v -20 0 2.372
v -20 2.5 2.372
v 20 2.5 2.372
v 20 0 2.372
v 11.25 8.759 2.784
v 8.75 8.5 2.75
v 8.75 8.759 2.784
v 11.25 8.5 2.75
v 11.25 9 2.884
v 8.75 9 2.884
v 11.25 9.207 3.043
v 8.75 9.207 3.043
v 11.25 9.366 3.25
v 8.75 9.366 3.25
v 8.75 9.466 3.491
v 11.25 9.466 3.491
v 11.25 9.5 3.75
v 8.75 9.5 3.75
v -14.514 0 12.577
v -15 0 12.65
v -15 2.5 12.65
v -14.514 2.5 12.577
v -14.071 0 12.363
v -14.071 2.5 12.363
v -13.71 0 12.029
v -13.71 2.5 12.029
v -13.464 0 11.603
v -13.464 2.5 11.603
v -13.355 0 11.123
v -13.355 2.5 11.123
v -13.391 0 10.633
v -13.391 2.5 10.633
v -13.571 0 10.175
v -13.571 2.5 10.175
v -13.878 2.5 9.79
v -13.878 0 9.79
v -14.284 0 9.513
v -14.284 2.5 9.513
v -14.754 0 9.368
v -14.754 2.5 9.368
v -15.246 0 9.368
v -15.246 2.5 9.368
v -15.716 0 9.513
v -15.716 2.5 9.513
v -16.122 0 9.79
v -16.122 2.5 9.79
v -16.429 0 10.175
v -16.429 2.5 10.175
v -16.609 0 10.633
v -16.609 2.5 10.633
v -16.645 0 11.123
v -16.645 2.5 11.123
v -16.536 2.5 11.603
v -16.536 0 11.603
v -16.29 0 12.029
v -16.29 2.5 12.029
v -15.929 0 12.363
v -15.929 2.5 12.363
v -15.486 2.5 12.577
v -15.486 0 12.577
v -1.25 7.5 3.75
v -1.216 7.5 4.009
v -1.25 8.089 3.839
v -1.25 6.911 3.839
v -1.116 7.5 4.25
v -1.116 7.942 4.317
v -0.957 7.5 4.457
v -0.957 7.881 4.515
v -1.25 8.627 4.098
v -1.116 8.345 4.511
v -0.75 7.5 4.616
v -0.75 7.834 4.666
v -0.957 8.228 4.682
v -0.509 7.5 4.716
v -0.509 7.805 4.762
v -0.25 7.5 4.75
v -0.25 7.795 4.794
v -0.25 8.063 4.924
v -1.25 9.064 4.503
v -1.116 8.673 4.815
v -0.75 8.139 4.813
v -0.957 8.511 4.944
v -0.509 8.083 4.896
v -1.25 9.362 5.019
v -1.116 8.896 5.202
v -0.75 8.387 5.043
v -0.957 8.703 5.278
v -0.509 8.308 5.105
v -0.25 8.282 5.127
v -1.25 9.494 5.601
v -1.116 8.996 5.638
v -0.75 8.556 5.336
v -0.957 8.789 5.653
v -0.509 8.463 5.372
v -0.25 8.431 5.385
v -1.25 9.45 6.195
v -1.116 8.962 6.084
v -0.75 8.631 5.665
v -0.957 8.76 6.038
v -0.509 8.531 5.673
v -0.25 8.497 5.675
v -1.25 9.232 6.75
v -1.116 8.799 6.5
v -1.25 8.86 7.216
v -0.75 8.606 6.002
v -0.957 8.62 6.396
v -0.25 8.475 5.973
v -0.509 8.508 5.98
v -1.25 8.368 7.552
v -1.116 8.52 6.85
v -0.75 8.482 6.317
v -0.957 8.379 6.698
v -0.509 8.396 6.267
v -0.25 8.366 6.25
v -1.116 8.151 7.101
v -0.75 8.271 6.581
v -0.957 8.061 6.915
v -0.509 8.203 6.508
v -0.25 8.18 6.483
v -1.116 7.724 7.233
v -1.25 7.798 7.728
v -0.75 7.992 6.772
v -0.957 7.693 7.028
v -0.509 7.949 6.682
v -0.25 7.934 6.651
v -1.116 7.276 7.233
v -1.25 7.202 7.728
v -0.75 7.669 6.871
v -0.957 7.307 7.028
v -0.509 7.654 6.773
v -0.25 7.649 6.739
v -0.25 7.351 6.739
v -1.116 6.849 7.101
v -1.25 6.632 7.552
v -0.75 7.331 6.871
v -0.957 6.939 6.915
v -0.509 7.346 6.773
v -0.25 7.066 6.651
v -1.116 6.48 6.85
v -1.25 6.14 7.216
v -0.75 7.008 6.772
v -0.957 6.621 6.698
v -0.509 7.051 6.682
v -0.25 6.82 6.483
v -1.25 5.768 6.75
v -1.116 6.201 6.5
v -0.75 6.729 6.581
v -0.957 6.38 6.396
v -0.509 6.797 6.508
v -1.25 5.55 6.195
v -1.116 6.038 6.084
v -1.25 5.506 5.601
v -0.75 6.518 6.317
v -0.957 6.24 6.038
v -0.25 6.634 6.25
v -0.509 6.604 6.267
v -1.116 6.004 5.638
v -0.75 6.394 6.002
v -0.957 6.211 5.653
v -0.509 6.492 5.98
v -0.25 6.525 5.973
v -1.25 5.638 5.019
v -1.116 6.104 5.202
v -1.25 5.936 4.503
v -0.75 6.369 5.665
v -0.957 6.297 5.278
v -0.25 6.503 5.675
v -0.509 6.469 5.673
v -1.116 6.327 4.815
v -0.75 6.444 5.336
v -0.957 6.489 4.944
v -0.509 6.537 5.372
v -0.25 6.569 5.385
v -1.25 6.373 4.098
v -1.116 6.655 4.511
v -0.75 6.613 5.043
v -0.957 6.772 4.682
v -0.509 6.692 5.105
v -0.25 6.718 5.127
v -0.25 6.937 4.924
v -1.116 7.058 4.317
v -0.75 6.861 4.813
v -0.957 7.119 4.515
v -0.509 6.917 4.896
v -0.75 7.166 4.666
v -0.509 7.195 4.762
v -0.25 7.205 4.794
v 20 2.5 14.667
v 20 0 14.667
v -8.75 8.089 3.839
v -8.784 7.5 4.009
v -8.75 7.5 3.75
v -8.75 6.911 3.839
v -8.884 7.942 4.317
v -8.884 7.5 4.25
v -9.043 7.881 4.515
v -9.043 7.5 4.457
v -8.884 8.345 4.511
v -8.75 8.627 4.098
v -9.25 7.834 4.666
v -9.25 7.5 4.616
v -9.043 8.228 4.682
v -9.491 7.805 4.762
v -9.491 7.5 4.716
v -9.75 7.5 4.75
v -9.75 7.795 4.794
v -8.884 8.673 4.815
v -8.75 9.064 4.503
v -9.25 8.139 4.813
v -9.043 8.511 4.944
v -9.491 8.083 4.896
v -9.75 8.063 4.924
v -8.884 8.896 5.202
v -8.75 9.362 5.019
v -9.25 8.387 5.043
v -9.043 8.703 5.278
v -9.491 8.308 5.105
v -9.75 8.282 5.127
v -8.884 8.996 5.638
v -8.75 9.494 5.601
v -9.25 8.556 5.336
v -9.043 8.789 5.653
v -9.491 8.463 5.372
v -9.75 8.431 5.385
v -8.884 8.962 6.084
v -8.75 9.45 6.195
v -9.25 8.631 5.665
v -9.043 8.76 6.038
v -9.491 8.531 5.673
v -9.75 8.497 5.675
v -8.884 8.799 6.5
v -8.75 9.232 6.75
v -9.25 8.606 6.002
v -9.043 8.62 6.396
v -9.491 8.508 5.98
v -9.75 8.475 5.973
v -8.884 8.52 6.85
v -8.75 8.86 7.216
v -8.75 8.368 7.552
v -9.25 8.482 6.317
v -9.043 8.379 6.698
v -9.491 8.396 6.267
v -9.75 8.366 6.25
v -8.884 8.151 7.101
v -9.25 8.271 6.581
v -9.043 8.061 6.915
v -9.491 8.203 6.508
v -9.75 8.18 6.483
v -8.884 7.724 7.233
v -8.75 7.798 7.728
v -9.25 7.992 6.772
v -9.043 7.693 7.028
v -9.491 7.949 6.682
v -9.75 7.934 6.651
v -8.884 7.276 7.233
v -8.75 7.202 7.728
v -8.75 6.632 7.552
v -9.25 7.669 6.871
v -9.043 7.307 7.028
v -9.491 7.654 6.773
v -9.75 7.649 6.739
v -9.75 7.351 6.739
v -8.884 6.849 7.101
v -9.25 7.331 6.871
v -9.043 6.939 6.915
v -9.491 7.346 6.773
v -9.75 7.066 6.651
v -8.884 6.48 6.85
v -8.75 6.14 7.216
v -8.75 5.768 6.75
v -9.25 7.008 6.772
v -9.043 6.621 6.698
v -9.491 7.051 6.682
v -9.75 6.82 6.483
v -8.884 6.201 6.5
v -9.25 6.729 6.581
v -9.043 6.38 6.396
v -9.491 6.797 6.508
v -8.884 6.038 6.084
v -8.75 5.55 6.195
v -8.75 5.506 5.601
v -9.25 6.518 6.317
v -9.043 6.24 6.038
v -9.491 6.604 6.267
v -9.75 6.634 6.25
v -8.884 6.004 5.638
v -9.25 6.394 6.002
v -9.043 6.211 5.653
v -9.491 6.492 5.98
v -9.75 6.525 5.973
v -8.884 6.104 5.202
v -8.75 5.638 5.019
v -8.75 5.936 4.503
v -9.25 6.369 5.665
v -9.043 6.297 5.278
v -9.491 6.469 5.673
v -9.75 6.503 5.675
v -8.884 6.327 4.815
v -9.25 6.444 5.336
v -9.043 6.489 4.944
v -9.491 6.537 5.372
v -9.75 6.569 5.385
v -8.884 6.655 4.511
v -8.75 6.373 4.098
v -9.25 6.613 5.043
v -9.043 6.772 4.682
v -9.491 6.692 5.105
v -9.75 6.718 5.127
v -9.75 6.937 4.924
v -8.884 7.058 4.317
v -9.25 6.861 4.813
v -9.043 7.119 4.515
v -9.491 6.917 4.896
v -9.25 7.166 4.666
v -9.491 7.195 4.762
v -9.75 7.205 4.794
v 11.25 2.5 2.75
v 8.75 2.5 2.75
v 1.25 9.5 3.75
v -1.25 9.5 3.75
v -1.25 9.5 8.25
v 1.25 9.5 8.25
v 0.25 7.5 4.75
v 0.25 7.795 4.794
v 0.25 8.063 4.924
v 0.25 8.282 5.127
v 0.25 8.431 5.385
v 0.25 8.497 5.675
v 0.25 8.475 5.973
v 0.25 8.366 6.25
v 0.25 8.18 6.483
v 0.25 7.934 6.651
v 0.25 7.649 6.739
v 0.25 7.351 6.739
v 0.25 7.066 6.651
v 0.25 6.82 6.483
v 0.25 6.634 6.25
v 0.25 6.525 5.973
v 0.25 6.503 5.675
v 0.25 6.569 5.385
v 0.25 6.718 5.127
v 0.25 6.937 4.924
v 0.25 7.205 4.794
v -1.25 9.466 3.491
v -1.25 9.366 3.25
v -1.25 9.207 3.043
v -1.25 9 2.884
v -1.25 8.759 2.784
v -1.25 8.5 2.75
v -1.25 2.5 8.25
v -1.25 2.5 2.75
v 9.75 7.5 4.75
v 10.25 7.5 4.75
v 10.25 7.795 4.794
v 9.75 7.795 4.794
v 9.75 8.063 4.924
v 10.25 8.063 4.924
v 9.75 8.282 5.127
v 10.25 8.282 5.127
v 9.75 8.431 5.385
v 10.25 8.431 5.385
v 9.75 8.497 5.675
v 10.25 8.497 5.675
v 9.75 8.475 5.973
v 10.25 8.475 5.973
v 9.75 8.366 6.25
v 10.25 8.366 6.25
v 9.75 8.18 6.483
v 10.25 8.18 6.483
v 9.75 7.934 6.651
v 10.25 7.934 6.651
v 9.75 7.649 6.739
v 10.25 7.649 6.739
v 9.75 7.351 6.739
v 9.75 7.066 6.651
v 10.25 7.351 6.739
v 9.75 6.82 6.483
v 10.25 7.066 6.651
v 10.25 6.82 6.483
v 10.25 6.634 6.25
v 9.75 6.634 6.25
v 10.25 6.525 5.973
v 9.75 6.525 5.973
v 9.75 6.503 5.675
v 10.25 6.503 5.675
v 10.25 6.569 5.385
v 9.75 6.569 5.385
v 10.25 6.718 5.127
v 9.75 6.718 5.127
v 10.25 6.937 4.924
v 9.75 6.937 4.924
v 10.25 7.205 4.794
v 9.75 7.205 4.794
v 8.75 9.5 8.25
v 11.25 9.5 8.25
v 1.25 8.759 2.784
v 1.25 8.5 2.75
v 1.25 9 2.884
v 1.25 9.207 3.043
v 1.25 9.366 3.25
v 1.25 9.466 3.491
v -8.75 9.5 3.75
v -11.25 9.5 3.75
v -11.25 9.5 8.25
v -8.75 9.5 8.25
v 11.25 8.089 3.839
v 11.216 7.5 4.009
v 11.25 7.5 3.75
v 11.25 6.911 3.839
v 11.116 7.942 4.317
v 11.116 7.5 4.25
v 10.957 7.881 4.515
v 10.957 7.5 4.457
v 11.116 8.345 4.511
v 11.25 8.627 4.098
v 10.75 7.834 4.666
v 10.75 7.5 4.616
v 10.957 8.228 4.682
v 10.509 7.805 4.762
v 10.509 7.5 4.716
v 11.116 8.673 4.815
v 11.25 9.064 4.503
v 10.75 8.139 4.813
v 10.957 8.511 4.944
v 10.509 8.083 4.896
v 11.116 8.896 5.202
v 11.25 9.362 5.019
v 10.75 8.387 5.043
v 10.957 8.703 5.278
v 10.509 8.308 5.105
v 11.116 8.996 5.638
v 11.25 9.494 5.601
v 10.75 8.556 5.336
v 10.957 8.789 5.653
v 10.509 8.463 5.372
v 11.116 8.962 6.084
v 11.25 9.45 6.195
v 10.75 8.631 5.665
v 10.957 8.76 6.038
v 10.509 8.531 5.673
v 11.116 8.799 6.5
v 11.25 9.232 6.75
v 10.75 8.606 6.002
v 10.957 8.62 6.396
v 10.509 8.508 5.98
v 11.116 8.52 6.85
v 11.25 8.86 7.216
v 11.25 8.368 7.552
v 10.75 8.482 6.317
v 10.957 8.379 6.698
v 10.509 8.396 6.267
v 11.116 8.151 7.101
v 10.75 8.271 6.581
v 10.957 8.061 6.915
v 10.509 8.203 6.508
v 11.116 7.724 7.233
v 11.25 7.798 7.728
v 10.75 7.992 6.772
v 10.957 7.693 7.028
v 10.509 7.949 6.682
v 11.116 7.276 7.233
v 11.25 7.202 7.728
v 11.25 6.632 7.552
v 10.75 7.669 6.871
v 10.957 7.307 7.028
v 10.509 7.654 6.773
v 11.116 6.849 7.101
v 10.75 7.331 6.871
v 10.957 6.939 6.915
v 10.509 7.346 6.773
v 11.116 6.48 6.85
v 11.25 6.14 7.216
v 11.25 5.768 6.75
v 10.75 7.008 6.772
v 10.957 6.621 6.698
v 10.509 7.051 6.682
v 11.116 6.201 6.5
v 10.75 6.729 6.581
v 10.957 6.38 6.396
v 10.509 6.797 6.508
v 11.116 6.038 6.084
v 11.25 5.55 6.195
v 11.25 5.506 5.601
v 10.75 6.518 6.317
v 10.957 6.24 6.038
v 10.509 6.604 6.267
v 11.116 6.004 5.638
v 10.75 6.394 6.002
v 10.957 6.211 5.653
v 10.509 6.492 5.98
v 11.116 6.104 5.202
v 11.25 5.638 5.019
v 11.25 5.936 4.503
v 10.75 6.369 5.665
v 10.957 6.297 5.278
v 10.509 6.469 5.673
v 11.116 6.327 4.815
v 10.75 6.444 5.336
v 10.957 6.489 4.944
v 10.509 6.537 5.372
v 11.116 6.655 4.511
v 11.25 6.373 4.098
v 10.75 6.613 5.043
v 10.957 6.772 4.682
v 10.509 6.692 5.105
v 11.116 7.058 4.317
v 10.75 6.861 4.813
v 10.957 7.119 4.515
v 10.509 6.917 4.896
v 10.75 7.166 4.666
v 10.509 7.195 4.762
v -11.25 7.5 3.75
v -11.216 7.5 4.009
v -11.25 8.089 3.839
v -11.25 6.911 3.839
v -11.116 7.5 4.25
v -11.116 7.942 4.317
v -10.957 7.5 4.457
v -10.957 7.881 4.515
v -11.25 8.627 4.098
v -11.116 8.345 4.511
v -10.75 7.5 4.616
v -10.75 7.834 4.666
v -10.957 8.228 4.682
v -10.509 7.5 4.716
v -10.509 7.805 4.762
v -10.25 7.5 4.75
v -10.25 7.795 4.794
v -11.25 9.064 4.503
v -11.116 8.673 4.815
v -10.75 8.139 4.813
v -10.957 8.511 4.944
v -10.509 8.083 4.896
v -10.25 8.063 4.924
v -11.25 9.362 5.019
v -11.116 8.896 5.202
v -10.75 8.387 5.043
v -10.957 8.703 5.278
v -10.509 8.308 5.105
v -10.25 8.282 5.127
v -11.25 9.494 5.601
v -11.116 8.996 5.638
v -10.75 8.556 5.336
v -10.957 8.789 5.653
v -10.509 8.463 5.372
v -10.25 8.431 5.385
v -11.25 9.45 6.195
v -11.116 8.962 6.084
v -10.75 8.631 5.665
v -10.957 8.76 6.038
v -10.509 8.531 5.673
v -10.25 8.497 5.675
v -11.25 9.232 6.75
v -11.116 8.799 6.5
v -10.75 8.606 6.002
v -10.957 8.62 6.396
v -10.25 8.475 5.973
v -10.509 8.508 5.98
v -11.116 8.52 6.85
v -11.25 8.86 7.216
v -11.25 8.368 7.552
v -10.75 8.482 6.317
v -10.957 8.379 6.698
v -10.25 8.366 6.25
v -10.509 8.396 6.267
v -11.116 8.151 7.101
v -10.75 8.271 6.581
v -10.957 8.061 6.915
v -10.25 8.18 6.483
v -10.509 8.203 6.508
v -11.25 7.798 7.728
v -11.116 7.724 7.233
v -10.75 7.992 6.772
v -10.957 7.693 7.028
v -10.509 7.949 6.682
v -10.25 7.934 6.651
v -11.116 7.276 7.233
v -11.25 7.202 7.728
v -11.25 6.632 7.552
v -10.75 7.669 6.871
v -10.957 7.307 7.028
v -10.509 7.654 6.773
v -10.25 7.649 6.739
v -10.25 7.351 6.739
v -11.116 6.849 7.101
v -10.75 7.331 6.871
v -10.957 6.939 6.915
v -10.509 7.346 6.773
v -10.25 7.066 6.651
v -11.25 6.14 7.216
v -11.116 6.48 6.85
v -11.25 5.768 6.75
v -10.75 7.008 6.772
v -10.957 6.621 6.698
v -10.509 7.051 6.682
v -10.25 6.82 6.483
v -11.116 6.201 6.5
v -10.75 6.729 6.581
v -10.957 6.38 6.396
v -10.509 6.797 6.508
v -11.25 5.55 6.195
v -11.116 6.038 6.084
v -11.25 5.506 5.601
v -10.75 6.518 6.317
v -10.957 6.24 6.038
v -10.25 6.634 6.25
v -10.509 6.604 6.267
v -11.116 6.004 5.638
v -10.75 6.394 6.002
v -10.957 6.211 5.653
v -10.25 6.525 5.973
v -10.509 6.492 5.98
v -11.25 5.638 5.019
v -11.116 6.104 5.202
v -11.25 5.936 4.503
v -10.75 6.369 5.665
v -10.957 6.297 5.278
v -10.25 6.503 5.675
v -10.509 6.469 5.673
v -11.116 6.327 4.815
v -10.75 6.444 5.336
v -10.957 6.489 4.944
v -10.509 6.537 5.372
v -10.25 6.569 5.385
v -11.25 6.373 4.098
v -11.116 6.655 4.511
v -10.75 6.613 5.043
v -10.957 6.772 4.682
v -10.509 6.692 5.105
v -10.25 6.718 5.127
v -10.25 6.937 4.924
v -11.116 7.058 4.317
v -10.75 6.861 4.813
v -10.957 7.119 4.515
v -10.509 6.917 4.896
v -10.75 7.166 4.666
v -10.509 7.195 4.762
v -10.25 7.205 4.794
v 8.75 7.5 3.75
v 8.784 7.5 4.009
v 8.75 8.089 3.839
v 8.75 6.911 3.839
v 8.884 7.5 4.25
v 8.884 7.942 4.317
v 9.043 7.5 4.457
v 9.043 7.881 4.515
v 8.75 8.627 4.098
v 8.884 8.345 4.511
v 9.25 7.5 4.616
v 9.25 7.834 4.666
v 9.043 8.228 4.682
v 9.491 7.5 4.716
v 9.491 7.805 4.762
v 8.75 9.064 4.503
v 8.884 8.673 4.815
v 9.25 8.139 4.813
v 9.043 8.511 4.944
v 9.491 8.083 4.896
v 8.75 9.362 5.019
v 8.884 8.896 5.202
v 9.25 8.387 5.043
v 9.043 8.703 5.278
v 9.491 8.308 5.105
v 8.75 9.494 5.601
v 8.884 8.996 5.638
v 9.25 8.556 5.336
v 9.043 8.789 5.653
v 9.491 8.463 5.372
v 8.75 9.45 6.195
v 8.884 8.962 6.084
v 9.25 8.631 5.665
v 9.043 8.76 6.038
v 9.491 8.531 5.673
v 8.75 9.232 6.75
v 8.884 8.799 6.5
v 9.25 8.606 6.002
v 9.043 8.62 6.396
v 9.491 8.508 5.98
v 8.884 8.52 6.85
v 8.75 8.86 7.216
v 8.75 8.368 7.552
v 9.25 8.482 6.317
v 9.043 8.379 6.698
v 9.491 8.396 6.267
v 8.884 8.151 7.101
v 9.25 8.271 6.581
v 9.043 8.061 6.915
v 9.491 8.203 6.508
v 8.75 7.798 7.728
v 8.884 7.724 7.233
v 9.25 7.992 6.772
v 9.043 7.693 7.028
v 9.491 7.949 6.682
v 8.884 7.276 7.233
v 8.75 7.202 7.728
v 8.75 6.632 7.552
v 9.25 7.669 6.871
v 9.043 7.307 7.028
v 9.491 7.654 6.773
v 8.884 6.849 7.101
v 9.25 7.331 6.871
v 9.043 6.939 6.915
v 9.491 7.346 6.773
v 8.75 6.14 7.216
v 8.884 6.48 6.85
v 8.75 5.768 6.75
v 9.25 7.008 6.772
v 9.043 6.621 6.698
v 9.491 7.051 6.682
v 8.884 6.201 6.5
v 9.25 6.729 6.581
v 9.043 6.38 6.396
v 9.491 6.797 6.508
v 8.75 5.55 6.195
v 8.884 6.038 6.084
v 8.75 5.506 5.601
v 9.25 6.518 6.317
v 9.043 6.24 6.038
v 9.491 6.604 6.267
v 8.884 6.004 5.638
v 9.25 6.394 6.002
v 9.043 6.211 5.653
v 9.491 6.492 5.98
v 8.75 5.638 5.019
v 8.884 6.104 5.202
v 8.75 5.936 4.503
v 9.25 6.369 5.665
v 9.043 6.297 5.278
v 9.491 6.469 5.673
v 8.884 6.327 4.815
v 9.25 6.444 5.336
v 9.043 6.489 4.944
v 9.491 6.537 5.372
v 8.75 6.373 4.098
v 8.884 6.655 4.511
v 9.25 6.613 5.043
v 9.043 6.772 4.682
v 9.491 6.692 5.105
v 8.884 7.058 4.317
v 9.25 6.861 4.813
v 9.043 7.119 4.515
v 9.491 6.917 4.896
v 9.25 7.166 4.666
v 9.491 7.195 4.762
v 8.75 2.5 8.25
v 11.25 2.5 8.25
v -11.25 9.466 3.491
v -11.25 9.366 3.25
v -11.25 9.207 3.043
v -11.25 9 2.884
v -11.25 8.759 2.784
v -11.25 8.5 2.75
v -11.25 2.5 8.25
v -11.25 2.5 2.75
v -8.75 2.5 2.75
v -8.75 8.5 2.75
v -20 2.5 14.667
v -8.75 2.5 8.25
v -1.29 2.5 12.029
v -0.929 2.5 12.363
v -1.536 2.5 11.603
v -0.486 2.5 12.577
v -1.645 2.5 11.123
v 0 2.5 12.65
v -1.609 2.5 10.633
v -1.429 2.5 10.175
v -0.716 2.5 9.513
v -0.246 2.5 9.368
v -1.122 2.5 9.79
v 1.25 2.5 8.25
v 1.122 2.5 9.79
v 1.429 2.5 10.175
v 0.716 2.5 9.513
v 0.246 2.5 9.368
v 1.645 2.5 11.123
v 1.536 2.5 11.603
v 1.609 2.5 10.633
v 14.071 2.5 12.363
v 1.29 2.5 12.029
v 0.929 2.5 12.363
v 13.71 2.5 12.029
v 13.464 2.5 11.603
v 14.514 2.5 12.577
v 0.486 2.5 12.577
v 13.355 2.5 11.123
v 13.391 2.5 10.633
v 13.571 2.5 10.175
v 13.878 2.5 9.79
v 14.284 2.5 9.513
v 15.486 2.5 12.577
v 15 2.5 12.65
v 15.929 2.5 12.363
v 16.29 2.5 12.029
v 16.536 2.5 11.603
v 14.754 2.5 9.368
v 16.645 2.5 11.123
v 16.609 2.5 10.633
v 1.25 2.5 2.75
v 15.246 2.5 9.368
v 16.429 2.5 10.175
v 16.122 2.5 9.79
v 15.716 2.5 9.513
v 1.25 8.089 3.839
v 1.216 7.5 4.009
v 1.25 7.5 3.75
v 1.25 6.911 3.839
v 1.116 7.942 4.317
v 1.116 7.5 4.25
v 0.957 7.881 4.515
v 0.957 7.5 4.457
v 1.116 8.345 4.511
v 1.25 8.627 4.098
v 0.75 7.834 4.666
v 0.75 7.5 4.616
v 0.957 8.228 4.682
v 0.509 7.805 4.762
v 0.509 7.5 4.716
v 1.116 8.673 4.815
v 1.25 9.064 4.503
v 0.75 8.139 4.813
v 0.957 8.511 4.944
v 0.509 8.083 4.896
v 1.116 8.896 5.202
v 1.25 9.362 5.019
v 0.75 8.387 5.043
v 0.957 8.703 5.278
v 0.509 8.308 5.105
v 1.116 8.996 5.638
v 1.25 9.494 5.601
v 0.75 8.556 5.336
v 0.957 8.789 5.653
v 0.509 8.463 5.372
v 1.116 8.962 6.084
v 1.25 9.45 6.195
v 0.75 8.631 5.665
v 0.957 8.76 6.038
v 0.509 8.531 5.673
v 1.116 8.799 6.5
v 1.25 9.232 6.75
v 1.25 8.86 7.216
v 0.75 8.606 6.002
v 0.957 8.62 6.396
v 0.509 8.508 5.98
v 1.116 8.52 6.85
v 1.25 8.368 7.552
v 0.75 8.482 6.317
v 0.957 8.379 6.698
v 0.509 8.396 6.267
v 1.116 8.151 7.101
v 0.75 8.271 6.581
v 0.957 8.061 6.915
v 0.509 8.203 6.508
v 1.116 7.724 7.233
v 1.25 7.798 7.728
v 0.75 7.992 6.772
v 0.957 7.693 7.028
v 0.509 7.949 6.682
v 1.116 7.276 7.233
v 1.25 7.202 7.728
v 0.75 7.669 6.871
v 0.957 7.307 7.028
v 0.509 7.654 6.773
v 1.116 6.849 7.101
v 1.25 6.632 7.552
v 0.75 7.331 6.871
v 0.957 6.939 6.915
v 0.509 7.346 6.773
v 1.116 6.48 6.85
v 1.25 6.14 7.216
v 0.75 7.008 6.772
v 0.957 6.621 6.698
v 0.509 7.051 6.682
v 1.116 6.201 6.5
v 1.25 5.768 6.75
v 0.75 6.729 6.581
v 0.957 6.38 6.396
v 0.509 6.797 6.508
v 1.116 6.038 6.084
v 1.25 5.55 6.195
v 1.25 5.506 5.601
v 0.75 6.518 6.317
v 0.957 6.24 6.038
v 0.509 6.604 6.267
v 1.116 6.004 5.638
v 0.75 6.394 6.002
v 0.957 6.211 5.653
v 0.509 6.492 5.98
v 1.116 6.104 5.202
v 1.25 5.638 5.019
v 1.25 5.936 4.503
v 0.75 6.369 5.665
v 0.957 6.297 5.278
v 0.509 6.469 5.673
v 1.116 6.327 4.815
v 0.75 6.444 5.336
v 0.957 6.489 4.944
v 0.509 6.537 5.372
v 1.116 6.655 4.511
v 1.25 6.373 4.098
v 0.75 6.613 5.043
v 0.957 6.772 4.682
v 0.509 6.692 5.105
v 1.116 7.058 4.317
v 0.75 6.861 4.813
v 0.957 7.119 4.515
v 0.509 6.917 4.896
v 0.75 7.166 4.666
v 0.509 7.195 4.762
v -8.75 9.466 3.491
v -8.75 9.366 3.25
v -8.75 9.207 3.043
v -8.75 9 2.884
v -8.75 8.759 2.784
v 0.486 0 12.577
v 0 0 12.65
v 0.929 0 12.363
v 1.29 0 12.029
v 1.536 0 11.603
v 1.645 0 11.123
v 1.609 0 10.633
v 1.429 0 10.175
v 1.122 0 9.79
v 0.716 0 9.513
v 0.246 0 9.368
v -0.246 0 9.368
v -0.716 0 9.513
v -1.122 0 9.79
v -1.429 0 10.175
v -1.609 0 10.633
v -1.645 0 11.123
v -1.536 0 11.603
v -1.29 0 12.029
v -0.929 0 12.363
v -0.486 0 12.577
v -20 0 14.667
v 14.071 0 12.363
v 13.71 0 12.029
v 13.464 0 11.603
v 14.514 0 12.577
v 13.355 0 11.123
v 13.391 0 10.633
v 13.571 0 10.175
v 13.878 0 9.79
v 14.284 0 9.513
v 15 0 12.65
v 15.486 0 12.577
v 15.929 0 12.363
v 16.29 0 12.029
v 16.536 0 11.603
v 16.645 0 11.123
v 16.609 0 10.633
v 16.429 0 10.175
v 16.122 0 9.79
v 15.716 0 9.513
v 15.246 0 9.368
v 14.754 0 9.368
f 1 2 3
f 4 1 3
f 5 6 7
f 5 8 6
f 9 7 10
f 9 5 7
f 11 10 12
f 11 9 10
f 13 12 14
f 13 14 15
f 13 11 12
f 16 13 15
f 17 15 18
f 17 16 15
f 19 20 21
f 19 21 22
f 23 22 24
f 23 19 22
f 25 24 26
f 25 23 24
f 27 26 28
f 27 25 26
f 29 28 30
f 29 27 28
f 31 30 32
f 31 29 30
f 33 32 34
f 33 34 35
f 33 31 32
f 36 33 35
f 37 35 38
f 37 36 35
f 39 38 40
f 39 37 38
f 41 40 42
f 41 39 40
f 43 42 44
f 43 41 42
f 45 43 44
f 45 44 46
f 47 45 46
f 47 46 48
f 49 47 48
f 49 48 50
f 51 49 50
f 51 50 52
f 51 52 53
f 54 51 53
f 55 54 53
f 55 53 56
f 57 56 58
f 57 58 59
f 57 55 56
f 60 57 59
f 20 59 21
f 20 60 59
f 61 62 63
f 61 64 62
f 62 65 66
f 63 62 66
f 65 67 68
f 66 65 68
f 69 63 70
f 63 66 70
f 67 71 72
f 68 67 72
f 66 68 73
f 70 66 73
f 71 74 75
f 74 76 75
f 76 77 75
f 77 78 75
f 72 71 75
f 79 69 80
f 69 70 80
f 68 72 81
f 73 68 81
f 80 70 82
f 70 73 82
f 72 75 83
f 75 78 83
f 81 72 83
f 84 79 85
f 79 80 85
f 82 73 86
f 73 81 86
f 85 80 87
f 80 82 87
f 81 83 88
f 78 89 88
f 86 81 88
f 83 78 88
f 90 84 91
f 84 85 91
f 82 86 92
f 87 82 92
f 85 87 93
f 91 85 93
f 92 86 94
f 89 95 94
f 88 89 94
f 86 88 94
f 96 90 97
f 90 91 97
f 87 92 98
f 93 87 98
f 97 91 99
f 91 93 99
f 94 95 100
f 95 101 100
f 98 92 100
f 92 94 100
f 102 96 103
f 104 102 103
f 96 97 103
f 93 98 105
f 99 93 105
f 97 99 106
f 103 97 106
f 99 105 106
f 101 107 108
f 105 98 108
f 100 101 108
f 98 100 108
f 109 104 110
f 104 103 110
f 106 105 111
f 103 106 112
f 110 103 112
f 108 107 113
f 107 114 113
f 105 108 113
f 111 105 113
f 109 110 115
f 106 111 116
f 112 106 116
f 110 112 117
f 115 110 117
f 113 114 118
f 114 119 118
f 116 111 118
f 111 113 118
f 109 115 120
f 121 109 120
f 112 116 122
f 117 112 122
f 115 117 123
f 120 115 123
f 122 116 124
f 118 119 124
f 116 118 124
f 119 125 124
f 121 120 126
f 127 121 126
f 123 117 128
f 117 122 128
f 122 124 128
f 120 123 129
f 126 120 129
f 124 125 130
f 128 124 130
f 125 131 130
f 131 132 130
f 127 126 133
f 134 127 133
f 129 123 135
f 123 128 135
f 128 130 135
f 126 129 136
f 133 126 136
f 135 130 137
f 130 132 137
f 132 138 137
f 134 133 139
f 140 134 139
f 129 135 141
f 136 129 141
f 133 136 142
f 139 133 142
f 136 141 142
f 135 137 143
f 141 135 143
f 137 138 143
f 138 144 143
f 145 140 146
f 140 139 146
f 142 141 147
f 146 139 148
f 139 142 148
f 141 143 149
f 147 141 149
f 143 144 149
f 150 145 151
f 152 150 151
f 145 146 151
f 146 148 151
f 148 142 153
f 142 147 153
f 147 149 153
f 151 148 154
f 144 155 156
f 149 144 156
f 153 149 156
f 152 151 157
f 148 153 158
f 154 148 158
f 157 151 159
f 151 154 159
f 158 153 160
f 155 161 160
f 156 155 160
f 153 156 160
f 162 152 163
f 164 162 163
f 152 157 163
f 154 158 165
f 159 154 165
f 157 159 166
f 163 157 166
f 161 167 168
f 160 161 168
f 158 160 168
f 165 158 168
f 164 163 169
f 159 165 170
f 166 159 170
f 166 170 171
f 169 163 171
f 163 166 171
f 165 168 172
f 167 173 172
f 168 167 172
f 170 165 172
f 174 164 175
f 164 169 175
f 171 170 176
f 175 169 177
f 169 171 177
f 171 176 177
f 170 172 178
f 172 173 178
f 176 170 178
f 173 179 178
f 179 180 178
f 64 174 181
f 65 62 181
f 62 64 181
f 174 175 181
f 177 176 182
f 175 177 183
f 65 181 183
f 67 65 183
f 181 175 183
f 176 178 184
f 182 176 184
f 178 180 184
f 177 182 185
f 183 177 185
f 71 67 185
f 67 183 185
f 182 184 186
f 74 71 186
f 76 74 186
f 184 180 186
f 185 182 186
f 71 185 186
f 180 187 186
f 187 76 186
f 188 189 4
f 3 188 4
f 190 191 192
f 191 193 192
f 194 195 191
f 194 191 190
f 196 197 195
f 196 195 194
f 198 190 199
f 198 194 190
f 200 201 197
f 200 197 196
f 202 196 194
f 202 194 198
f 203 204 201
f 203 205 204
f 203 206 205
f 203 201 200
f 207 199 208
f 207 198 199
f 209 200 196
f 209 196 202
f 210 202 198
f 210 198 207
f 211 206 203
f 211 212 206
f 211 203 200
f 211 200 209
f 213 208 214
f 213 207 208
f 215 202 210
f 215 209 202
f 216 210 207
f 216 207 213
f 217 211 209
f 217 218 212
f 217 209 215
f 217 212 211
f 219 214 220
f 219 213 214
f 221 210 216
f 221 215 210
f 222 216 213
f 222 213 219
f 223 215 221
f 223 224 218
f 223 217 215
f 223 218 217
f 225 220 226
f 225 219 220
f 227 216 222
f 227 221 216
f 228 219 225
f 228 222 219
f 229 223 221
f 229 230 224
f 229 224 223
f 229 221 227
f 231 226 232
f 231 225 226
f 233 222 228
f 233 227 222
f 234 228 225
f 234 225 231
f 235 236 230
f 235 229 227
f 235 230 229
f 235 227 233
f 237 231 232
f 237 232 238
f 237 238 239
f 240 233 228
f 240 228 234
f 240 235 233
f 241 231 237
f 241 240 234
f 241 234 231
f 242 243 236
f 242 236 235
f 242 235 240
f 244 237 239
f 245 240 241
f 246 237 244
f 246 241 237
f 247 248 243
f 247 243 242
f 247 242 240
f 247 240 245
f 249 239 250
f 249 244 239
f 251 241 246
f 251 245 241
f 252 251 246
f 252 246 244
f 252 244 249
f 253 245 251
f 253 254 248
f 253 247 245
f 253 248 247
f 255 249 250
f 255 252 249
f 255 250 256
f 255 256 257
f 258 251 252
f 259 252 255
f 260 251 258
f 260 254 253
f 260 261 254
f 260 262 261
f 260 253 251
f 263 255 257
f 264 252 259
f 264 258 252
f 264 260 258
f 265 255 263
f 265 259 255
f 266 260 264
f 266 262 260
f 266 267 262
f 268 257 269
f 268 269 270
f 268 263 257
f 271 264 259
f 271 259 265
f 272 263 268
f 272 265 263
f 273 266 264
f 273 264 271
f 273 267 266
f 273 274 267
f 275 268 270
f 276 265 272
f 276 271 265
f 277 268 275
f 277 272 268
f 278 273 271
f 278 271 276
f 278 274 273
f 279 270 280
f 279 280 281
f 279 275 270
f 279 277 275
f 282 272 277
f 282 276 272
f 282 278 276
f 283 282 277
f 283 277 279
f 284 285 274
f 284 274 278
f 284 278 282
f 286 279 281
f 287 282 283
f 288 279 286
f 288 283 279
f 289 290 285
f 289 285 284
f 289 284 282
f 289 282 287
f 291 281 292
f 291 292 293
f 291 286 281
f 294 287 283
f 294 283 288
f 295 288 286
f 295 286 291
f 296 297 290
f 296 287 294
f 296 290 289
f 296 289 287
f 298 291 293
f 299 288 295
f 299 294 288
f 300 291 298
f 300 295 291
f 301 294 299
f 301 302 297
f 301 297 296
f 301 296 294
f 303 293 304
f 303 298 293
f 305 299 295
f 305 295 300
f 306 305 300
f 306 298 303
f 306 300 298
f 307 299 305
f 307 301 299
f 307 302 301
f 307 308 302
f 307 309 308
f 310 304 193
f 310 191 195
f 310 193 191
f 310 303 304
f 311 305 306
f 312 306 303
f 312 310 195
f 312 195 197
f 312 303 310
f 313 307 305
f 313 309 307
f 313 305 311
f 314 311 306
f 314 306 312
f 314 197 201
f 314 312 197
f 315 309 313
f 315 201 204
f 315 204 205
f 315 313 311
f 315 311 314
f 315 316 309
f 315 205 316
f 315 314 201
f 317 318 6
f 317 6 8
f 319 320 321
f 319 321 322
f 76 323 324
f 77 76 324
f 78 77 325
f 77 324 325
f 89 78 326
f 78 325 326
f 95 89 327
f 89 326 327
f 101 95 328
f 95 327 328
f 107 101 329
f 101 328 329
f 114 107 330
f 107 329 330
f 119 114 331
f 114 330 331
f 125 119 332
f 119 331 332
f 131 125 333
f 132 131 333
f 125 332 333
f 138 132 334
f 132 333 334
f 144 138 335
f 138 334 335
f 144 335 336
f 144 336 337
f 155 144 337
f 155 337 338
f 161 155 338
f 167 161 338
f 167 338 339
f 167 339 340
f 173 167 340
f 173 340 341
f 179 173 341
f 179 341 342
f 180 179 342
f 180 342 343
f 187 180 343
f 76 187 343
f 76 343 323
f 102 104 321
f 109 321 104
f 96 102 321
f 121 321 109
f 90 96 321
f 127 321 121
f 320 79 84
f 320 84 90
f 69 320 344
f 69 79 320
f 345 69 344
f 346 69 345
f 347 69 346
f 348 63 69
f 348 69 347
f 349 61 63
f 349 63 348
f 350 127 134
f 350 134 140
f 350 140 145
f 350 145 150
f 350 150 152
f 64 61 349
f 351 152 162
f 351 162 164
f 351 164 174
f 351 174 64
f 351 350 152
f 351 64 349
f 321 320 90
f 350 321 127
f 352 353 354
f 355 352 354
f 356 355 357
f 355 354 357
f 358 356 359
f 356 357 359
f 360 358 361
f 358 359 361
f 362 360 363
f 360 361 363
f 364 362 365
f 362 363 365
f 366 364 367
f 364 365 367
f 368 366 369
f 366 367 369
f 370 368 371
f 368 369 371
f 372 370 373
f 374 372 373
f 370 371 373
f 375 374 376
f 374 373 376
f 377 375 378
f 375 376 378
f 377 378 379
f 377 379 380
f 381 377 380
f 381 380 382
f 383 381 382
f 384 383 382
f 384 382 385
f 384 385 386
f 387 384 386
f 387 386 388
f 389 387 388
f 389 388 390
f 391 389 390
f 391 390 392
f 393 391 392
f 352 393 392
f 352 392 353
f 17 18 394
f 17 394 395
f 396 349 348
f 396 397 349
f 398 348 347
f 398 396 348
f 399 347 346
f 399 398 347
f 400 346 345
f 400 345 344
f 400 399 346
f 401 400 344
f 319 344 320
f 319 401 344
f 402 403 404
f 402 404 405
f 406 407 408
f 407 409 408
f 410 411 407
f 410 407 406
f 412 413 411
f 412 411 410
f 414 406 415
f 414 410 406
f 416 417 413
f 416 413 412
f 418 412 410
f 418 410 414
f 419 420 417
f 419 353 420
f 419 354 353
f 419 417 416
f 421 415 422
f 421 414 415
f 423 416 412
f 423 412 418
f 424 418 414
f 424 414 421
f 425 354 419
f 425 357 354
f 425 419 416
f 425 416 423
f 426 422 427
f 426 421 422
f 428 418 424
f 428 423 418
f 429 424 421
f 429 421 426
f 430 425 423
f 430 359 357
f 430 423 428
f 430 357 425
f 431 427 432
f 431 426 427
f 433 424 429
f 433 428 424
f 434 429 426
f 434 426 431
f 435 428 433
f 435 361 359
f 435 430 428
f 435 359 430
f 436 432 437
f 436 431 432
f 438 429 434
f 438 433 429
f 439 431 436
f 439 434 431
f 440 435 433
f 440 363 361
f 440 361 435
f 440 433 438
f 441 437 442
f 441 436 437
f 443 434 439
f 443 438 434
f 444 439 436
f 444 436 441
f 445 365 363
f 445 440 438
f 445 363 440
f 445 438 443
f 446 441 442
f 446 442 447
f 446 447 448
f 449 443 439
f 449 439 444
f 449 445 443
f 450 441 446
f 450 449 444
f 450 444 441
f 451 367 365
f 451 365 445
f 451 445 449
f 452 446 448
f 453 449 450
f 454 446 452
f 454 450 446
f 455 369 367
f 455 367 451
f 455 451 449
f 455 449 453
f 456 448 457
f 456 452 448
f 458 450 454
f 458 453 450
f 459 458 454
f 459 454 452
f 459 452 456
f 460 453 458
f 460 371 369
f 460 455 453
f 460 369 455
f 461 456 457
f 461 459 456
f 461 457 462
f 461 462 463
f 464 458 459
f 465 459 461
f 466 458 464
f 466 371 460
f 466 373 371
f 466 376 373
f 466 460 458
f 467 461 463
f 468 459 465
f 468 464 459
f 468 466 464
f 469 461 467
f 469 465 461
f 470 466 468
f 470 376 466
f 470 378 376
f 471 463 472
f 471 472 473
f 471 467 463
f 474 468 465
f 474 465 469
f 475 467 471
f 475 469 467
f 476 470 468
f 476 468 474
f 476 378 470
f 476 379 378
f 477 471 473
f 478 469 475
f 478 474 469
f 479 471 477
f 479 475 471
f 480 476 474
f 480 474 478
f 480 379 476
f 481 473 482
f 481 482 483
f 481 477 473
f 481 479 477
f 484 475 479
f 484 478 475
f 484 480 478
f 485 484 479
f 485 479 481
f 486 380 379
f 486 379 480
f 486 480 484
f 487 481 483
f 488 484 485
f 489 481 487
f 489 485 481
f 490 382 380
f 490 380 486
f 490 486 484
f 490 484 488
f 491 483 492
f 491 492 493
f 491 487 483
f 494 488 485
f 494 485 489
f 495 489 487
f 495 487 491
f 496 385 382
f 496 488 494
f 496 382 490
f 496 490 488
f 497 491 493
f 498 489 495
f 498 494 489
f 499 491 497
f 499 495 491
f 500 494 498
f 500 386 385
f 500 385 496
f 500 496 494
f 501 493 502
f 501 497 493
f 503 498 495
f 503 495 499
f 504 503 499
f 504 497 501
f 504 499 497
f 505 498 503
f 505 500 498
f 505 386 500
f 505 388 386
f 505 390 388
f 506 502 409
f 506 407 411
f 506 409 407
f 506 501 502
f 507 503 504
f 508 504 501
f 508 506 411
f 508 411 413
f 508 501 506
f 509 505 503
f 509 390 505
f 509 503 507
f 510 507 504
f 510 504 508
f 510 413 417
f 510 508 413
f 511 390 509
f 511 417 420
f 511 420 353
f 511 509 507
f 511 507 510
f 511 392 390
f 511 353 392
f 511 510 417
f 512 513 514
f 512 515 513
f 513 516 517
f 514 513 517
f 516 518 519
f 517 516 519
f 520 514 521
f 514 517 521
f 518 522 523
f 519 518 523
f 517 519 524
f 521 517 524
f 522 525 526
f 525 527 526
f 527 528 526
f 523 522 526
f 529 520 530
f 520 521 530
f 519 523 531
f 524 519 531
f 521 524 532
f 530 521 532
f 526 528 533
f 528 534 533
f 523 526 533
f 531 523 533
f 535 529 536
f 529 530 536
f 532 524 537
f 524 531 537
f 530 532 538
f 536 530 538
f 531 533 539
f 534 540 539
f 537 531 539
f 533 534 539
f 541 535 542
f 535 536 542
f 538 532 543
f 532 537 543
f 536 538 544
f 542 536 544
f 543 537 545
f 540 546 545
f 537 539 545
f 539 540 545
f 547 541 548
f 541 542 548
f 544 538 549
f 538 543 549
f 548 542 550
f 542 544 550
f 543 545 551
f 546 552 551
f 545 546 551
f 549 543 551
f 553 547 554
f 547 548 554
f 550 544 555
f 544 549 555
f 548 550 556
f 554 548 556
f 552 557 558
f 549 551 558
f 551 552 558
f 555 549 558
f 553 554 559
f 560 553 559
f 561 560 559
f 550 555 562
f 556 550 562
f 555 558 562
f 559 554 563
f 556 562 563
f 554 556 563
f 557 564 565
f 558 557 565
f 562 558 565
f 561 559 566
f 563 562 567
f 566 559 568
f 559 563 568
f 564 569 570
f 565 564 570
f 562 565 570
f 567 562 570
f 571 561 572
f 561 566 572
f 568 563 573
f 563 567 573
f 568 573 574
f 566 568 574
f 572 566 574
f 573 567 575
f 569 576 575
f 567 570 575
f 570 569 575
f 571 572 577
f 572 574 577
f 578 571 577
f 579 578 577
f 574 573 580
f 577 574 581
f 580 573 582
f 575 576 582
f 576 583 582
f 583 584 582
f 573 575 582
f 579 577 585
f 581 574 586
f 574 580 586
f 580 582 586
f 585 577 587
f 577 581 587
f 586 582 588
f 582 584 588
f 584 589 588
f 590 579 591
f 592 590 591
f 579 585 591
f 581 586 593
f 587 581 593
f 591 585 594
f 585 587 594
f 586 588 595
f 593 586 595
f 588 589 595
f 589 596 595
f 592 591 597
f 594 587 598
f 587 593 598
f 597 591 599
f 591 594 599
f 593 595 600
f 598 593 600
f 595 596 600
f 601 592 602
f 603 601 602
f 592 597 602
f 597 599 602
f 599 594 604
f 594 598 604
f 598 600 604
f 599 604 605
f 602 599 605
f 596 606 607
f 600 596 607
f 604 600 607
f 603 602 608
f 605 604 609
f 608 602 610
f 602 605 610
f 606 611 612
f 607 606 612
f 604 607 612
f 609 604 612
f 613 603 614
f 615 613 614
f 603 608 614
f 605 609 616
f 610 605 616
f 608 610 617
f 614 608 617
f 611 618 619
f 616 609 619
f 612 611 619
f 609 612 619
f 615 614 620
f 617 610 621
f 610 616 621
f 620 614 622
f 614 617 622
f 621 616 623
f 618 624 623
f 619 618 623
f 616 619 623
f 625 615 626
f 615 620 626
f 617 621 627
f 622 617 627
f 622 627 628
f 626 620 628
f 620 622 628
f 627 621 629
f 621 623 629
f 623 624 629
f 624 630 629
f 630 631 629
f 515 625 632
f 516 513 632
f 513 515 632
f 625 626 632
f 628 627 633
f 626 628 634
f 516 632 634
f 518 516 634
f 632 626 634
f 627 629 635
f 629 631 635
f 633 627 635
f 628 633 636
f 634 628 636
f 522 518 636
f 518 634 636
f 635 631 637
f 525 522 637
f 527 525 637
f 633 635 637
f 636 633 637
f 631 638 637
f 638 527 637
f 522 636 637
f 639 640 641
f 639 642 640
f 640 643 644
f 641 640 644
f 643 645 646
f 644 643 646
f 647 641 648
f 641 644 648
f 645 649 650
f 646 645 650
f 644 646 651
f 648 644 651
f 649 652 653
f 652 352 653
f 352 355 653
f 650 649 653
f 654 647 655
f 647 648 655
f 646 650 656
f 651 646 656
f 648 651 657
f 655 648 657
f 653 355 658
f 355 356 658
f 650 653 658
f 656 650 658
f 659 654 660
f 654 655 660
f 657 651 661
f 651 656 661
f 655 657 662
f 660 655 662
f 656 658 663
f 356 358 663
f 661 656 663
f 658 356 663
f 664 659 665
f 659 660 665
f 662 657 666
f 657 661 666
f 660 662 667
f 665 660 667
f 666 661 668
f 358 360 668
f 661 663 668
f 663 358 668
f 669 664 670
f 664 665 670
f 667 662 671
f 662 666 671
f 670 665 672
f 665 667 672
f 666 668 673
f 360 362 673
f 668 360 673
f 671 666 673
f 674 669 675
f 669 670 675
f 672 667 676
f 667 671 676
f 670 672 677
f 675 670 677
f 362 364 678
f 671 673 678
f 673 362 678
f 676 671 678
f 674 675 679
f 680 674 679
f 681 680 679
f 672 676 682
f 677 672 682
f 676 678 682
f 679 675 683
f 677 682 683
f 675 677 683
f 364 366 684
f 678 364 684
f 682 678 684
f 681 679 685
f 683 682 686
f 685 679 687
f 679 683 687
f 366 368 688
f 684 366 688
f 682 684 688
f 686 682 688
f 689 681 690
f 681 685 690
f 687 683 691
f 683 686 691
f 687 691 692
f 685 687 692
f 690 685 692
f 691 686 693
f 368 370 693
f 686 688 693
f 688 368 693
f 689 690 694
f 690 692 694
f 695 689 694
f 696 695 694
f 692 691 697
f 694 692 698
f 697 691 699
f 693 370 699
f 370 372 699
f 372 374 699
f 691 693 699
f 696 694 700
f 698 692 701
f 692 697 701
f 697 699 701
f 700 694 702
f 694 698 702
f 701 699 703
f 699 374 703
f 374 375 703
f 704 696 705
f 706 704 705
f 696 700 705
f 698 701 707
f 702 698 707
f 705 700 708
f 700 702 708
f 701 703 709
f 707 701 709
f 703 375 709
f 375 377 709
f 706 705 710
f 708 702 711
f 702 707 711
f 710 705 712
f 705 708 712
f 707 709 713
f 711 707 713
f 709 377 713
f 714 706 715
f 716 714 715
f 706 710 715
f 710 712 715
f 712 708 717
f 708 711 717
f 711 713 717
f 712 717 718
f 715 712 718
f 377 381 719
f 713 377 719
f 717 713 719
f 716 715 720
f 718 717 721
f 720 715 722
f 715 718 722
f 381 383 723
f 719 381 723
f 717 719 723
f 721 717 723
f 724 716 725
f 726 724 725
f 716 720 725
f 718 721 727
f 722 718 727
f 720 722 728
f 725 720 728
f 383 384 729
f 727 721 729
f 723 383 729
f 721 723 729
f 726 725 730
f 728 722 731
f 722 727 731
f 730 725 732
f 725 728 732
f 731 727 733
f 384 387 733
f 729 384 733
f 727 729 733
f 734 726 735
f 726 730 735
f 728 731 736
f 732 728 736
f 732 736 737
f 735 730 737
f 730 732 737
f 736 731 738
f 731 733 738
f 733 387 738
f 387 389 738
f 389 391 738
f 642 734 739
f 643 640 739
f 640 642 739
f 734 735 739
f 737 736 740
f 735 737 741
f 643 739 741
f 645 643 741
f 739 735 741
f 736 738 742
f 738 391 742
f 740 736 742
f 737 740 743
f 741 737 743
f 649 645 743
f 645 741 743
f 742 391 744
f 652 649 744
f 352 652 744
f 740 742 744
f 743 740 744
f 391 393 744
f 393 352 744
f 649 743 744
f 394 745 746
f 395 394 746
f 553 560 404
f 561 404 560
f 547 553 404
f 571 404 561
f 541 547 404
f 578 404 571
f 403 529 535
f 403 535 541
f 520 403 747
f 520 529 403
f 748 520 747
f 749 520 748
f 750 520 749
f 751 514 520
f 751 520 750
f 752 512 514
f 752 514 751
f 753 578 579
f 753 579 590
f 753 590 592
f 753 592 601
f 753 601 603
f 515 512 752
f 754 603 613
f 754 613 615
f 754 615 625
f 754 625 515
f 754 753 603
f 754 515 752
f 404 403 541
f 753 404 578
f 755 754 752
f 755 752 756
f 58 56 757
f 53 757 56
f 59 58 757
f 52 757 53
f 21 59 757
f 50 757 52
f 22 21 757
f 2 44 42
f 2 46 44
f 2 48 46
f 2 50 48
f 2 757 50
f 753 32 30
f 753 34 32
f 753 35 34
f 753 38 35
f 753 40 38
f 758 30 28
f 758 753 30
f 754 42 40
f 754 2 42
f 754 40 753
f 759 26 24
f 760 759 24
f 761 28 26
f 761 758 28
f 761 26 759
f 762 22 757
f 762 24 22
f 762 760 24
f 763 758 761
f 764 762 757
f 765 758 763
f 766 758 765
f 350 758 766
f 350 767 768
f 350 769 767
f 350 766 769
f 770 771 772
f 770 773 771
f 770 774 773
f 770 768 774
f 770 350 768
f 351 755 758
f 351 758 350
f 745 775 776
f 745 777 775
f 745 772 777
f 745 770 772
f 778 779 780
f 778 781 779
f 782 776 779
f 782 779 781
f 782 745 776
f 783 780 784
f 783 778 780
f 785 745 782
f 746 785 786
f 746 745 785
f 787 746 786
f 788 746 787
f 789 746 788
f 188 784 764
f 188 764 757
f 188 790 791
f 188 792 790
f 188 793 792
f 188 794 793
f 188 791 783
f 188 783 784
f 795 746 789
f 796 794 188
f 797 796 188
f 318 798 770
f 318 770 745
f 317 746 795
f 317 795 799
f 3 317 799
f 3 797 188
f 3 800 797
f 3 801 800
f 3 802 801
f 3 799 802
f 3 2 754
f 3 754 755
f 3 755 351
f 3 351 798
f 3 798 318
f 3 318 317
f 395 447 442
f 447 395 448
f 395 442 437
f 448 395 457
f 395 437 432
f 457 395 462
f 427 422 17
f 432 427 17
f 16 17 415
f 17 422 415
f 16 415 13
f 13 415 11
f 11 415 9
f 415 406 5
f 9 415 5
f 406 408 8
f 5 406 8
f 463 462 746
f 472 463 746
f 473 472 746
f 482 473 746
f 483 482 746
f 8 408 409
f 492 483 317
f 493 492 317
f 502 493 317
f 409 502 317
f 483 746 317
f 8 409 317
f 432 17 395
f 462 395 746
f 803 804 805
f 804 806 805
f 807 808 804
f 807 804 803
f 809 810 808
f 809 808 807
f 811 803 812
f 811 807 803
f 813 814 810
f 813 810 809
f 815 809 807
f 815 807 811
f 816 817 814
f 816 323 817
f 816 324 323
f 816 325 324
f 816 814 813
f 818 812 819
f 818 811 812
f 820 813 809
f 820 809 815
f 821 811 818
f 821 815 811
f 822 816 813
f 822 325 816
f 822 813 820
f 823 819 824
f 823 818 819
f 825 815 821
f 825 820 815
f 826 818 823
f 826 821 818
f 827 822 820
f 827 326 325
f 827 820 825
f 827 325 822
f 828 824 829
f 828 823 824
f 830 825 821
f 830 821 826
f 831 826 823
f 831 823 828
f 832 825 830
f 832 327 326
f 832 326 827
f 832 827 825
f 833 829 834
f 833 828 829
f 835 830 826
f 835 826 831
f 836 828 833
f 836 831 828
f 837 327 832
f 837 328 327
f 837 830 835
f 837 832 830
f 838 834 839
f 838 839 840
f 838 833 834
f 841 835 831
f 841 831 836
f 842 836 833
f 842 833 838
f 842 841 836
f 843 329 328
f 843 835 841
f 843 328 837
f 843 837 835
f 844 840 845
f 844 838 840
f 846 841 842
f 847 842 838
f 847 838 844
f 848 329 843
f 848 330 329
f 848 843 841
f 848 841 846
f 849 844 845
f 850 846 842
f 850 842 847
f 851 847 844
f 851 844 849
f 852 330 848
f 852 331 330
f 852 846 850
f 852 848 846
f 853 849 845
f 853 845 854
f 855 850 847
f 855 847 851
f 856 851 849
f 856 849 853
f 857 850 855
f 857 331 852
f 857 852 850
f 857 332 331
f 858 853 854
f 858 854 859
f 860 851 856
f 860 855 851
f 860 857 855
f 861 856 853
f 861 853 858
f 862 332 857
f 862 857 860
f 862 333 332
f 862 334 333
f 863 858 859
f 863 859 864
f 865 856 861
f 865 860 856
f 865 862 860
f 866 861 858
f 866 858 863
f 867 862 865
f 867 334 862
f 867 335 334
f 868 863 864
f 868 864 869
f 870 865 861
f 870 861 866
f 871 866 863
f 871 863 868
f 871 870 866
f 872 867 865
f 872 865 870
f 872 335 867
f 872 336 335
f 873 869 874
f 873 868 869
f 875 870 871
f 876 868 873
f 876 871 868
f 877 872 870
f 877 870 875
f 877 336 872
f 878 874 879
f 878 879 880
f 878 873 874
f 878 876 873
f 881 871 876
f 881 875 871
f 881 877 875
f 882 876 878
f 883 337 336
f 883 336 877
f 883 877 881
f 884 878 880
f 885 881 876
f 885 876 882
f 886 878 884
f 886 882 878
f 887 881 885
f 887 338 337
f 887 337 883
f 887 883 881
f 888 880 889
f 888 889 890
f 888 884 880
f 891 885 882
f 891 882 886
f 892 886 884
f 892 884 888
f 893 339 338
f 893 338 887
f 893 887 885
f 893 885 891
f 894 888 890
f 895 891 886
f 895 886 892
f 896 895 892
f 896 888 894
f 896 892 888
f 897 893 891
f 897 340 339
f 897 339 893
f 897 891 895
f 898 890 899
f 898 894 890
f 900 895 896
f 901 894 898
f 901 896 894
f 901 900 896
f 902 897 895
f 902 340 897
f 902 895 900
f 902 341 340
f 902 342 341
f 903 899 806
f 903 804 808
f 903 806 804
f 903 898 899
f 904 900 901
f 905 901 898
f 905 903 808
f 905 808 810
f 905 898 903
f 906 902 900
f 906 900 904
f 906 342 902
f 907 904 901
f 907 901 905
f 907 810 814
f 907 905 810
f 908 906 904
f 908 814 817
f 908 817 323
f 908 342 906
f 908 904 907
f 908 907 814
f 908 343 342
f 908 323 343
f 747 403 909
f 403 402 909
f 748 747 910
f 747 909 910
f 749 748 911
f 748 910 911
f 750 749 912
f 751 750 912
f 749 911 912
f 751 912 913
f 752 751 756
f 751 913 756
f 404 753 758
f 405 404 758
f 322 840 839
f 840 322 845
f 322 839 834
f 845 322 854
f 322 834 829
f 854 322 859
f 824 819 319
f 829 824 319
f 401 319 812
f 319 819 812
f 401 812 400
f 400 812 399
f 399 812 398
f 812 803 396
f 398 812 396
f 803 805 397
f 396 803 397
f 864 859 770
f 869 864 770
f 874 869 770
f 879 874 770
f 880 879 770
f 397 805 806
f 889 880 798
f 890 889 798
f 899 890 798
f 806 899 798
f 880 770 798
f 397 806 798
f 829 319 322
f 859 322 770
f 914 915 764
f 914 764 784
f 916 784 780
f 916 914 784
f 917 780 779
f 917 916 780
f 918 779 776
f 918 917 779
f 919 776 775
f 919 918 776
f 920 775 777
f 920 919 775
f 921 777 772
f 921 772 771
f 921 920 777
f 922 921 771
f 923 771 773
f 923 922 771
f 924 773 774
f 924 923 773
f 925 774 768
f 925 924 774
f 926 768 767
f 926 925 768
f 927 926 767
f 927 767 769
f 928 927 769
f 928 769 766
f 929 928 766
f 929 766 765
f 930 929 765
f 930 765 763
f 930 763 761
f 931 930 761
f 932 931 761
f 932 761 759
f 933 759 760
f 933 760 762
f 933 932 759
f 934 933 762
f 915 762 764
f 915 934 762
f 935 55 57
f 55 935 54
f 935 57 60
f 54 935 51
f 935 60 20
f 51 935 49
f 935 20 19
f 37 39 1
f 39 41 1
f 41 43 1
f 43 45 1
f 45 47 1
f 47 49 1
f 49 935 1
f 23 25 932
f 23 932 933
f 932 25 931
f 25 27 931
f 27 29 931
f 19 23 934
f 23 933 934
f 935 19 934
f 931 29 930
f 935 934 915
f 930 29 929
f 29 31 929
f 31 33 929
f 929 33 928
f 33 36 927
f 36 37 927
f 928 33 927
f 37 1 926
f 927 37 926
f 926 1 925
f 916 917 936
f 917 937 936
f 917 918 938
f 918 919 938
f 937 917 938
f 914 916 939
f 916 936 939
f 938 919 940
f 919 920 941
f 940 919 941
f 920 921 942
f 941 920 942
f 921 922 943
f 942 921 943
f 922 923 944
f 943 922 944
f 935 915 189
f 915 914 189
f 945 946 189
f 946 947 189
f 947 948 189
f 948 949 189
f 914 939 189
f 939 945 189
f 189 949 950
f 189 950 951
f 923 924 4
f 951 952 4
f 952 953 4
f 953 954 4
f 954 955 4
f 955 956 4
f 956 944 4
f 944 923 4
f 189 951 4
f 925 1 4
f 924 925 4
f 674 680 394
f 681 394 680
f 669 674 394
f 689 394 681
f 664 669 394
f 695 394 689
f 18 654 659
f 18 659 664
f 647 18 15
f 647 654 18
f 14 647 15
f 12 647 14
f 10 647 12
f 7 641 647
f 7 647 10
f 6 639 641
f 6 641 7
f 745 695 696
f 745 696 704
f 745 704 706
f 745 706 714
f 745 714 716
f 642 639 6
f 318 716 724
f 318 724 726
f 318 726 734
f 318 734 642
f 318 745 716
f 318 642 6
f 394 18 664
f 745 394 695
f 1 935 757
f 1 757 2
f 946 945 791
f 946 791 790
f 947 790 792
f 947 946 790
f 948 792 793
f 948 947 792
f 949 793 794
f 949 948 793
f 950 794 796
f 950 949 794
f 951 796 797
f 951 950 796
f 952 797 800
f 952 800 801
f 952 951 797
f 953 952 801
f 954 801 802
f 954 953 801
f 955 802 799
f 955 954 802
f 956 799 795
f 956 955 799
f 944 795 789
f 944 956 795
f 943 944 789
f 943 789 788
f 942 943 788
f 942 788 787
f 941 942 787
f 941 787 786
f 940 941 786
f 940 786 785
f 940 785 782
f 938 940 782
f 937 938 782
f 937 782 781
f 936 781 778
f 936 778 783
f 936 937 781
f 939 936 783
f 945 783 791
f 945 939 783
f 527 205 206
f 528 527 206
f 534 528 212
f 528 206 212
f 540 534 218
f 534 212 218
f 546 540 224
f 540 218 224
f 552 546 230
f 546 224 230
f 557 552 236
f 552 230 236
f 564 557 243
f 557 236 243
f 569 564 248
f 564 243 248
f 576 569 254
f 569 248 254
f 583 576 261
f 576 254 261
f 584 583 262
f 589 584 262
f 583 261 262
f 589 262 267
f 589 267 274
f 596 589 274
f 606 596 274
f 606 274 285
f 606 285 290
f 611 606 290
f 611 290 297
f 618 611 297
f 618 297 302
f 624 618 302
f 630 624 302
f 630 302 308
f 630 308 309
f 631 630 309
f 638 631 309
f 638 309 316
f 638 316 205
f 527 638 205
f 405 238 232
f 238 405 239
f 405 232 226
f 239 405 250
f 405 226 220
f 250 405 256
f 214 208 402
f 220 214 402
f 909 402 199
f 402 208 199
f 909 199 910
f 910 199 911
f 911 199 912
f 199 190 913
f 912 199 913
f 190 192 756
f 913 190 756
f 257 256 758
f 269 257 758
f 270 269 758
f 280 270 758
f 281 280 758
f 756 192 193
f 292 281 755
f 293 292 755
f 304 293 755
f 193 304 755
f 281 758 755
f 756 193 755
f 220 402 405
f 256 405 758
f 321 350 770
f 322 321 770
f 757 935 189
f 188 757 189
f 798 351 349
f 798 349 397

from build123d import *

# Parameters (mm, degrees)
SKETCH1_W           = 40
SKETCH1_H           = 29.333333334
SKETCH1_R           = 1.65
BOSS_EXTRUDE1_DEPTH = 2.5
SKETCH2_W           = 2.5
SKETCH2_H           = 5.5
BOSS_EXTRUDE2_DEPTH = 7
CUT_EXTRUDE1_REACH  = 37.804
SKETCH3_R           = 1
FILLET1_R           = 1
FILLET2_R           = 1
CUT_EXTRUDE2_REACH  = 27.77
SKETCH4_W           = 40
SKETCH4_H           = 17.038815724


with BuildPart() as part:
    # Sketch1 → Boss-Extrude1 (new body)
    with BuildSketch(Plane(origin=(0, 0, 0), x_dir=(1, 0, 0), z_dir=(0, 1, 0))):
        Rectangle(SKETCH1_W, SKETCH1_H)
        with Locations(Location((-15, 11, 0), (0, 0, 270))):
            Circle(SKETCH1_R, mode=Mode.SUBTRACT)
        with Locations(Location((0, 11, 0), (0, 0, 270))):
            Circle(SKETCH1_R, mode=Mode.SUBTRACT)
        with Locations(Location((15, 11, 0), (0, 0, 270))):
            Circle(SKETCH1_R, mode=Mode.SUBTRACT)
        with Locations(Location((0, 0, 0), (0, 0, 270))):
            Circle(SKETCH1_R, mode=Mode.SUBTRACT)
        with Locations(Location((15, 0, 0), (0, 0, 270))):
            Circle(SKETCH1_R, mode=Mode.SUBTRACT)
        with Locations(Location((0, -11, 0), (0, 0, 270))):
            Circle(SKETCH1_R, mode=Mode.SUBTRACT)
        with Locations(Location((15, -11, 0), (0, 0, 270))):
            Circle(SKETCH1_R, mode=Mode.SUBTRACT)
        with Locations(Location((-15, 0, 0), (0, 0, 270))):
            Circle(SKETCH1_R, mode=Mode.SUBTRACT)
        with Locations(Location((-15, -11, 0), (0, 0, 270))):
            Circle(SKETCH1_R, mode=Mode.SUBTRACT)
    extrude(amount=BOSS_EXTRUDE1_DEPTH)

    # Sketch2 → Boss-Extrude2 (add)
    with BuildSketch(Plane(origin=(0, 2.5, 0), x_dir=(1, 0, 0), z_dir=(0, 1, 0))):
        with Locations((10, -5.5)):
            Rectangle(SKETCH2_W, SKETCH2_H)
        with Locations((0, -5.5)):
            Rectangle(SKETCH2_W, SKETCH2_H)
        with Locations((-10, -5.5)):
            Rectangle(SKETCH2_W, SKETCH2_H)
    extrude(amount=BOSS_EXTRUDE2_DEPTH)

    # Cut-Extrude1: up to this face of the body (flat: up to its plane)
    cut_extrude1_end = Plane(part.part.faces().sort_by_distance((-11.25, 6, 5.5))[0])
    # Sketch3 → Cut-Extrude1 (cut, up to the picked face)
    with BuildSketch(Plane(origin=(11.25, 0, 0), x_dir=(0, 0, -1), z_dir=(1, 0, 0)), mode=Mode.PRIVATE) as cut_extrude1_sk1:
        with Locations((-5.75, 7.5)):
            Circle(SKETCH3_R)
    cut_extrude1_tool1 = split(extrude(cut_extrude1_sk1.sketch, amount=-CUT_EXTRUDE1_REACH, mode=Mode.PRIVATE), bisect_by=cut_extrude1_end, keep=Keep.BOTH, mode=Mode.PRIVATE)
    add(cut_extrude1_tool1.solids().sort_by(Axis((11.25, 7.5, 5.75), (-1, 0, 0)))[0], mode=Mode.SUBTRACT)

    # Fillet1
    fillet1_edges = [part.edges().sort_by_distance(p)[0] for p in [
        (-1.25, 7.5, 6.75),
        (1.25, 7.5, 6.75),
        (8.75, 7.5, 6.75),
        (-8.75, 7.5, 6.75),
        (11.25, 7.5, 6.75),
        (-11.25, 7.5, 6.75),
    ]]
    fillet(fillet1_edges, radius=FILLET1_R - 0.0001)  # a hair under: the kernel refuses the full size

    # Fillet2
    fillet2_edges = [part.edges().sort_by_distance(p)[0] for p in [
        (0, 9.5, 2.75),
        (10, 9.5, 2.75),
        (-10, 9.5, 2.75),
    ]]
    fillet(fillet2_edges, radius=FILLET2_R)

    # Sketch4 → Cut-Extrude2 (cut, up to next)
    with BuildSketch(Plane(origin=(0, 2.5, 0), x_dir=(1, 0, 0), z_dir=(0, 1, 0)), mode=Mode.PRIVATE) as cut_extrude2_sk1:
        with Locations((0, 6.147258805)):
            Rectangle(SKETCH4_W, SKETCH4_H)
    cut_extrude2_tool1 = extrude(cut_extrude2_sk1.sketch, amount=-CUT_EXTRUDE2_REACH, mode=Mode.PRIVATE) & part.part
    add(cut_extrude2_tool1.solids().sort_by_distance((0, 2.5, -6.147259))[0], mode=Mode.SUBTRACT)


solid = part.part
